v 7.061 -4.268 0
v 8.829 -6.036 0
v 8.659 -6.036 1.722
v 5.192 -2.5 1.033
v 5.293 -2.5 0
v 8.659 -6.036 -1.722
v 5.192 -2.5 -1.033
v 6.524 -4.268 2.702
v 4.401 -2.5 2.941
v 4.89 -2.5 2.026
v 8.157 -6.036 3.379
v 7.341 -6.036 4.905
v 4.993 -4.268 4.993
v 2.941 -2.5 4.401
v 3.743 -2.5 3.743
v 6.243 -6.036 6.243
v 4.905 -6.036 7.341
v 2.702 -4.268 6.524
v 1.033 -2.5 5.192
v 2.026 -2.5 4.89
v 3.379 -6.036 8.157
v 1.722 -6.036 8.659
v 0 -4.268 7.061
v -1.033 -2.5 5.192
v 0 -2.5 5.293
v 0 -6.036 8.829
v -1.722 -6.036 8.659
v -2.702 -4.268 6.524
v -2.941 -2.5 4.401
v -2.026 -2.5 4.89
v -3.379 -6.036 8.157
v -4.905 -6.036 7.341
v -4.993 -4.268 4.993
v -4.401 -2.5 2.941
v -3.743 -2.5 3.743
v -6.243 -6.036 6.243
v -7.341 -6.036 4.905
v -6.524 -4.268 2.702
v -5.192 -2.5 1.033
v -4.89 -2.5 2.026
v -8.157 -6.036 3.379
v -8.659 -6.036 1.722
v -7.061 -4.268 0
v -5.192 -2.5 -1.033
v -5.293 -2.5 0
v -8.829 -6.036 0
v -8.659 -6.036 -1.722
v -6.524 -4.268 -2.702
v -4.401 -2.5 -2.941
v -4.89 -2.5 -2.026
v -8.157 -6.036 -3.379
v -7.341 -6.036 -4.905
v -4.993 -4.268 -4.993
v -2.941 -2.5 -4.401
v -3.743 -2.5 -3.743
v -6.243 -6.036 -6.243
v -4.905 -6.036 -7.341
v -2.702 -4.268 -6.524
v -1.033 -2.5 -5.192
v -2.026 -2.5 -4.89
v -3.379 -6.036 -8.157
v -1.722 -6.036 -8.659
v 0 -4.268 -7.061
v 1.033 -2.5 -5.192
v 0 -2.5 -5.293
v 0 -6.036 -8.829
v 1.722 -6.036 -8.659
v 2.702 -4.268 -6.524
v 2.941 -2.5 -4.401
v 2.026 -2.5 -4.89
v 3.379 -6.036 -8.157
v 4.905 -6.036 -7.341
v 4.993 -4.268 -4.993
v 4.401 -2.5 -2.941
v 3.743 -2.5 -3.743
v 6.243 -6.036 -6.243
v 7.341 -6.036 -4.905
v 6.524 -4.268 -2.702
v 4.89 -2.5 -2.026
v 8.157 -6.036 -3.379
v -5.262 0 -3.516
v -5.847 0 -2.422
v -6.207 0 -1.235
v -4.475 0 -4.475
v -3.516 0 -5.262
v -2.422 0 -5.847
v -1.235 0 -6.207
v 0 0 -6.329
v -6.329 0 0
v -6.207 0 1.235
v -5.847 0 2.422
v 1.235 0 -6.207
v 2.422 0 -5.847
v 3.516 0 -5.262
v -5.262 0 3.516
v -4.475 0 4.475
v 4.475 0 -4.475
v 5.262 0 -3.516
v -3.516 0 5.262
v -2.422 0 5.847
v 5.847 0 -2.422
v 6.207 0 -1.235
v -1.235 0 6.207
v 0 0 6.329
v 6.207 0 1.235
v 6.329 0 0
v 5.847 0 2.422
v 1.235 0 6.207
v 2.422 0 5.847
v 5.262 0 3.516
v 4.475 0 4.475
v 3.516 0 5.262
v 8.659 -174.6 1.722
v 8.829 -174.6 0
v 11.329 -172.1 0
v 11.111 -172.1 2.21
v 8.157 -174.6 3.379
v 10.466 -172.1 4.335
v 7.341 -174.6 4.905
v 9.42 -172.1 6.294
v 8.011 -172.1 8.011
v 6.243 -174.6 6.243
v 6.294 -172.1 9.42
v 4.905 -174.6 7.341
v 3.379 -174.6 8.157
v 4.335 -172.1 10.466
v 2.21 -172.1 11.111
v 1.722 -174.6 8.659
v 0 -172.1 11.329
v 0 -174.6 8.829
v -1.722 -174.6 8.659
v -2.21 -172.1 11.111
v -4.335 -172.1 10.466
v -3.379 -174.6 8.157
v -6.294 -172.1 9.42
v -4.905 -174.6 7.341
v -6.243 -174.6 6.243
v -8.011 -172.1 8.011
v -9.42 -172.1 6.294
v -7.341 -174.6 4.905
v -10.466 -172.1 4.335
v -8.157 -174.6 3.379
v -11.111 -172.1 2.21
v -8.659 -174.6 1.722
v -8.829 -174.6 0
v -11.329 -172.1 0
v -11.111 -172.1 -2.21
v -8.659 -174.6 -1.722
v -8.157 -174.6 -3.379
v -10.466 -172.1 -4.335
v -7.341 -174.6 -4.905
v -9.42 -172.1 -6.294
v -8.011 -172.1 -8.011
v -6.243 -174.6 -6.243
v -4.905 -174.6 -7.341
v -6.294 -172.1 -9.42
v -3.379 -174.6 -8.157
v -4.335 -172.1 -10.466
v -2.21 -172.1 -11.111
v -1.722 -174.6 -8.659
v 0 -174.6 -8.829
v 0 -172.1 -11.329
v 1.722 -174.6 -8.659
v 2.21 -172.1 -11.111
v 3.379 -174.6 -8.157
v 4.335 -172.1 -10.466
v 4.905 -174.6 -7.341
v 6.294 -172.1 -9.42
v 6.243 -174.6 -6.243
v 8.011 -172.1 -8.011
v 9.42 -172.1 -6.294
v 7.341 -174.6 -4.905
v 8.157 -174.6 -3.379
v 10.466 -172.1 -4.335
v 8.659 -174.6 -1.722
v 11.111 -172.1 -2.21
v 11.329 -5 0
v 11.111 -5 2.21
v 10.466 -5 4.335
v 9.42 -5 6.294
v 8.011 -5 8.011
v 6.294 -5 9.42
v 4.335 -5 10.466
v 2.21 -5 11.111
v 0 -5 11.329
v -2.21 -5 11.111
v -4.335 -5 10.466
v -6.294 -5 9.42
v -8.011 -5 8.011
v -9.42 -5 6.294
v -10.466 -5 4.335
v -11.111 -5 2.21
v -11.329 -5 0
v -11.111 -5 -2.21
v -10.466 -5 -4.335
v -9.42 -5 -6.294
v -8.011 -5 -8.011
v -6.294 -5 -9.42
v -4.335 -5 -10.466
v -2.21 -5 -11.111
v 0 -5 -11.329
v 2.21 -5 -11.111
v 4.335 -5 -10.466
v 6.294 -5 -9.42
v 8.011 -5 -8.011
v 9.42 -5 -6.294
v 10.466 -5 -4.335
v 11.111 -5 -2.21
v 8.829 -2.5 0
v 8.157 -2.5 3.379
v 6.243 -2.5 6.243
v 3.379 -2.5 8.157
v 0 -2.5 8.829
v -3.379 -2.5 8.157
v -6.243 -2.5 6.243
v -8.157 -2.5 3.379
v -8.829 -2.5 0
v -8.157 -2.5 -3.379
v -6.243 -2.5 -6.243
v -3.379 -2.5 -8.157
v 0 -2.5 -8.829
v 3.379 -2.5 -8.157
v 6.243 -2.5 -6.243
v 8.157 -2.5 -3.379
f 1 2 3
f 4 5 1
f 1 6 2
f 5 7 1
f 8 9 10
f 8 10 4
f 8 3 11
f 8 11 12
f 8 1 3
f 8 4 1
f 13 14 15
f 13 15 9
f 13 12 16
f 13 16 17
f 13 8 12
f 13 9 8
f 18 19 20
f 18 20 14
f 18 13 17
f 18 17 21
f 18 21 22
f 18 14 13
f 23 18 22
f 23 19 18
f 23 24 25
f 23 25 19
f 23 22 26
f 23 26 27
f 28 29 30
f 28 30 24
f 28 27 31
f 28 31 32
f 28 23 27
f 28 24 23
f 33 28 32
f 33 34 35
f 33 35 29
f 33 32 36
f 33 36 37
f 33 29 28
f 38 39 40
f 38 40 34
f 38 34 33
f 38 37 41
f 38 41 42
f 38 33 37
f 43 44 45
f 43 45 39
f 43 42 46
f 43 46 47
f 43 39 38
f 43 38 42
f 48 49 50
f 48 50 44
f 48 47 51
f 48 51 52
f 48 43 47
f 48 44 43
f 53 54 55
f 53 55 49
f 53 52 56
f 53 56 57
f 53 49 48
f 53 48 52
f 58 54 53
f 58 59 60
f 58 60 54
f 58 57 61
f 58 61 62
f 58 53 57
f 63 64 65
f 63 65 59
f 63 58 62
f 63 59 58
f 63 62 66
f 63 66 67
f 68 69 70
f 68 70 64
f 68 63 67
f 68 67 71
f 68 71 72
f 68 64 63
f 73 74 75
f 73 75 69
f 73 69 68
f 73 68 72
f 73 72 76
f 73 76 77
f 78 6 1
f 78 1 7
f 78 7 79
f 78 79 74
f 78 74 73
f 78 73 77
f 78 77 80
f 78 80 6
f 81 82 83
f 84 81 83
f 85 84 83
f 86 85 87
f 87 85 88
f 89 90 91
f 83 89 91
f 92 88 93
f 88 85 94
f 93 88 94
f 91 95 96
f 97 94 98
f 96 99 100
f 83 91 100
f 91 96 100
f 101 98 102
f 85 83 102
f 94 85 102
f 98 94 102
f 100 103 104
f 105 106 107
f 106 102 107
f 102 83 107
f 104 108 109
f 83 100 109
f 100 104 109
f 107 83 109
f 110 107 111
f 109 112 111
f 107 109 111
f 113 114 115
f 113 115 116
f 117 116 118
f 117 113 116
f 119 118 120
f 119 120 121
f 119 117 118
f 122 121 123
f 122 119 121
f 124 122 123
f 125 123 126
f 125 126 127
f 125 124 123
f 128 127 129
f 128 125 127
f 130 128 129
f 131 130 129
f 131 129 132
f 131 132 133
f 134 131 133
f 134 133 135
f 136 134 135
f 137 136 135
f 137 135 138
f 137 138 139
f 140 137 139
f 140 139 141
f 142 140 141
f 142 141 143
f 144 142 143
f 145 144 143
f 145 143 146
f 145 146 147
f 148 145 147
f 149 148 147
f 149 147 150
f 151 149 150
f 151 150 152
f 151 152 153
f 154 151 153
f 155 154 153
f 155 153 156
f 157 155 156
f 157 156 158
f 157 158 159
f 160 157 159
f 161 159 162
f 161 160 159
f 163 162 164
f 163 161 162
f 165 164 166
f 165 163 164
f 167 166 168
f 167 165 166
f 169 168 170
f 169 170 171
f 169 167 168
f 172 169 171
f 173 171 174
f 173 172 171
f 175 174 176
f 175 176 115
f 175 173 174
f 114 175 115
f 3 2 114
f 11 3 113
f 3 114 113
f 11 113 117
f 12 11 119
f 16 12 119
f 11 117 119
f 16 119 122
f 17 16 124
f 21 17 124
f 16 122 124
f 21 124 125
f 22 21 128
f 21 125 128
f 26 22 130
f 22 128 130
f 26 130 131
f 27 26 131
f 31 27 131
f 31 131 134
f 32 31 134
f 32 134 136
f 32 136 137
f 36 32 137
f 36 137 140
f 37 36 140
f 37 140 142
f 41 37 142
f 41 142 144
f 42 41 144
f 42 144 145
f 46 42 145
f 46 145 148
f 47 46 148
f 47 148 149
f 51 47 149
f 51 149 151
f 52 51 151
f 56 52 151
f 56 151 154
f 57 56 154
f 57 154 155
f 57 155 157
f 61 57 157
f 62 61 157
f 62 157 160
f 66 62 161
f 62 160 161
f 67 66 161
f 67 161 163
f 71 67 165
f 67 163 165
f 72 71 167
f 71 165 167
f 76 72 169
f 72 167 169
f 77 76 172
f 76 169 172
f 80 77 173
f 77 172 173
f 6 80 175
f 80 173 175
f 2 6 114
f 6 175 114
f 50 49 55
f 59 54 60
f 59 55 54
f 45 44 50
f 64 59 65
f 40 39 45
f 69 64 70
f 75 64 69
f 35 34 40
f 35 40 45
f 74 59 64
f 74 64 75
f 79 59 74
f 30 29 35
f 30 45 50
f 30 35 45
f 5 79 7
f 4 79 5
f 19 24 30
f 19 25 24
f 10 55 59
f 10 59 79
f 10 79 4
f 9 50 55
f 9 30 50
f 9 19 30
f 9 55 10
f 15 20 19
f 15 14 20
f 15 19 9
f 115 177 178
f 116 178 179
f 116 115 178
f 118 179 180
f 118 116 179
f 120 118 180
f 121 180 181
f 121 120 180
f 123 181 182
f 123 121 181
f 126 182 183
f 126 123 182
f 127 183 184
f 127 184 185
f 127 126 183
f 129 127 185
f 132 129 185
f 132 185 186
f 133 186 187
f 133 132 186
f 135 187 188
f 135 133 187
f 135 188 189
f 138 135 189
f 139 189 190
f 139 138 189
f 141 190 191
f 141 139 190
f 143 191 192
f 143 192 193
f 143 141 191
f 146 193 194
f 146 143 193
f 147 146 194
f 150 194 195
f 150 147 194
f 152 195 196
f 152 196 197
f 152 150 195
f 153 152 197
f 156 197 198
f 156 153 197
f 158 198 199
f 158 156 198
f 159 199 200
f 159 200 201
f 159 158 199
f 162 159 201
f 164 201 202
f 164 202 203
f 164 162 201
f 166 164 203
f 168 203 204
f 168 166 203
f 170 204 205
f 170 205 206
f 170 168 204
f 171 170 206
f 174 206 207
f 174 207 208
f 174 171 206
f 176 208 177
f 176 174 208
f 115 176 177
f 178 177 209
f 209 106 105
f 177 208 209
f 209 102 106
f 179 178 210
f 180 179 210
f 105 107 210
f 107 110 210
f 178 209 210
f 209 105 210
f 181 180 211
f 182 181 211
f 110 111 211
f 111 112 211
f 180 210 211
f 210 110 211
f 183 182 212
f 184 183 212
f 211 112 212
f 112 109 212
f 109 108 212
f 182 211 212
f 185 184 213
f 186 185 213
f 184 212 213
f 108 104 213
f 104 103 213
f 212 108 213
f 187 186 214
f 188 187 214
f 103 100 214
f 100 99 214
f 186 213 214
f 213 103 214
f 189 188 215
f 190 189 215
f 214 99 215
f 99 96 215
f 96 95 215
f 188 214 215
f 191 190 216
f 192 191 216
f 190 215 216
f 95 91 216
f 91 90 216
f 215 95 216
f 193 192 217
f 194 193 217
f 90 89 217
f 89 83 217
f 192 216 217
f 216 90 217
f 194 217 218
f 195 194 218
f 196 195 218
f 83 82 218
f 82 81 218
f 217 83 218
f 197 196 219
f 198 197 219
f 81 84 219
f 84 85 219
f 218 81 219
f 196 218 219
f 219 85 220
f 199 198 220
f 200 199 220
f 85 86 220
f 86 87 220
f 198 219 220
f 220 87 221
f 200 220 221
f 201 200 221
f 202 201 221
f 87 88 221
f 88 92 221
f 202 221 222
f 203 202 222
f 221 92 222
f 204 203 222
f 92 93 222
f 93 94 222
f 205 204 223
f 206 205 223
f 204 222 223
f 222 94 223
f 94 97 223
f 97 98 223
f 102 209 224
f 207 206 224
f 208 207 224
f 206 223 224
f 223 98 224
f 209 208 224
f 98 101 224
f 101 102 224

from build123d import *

# Parameters (mm, degrees)
F0_R     = 11.3287531589
F1_DEPTH = 177.1
F2_DEPTH = 52.2
F3_SIZE  = 5
F4_T     = -2.5


with BuildPart() as f1:
    # F0 (on Front) → F1 (new body)
    with BuildSketch(Plane.XZ):
        Circle(F0_R)
    extrude(amount=F1_DEPTH)

    # F2 (add): a face of the model
    f2_faces = [f1.faces().sort_by_distance(p)[0] for p in [
        (0, -177.1, 0),
    ]]
    extrude(f2_faces, amount=-F2_DEPTH)

    # F3
    f3_edges = [f1.edges().sort_by_distance(p)[0] for p in [
        (-11.328753, -177.1, 0),
        (-11.328753, 0, 0),
    ]]
    chamfer(f3_edges, length=F3_SIZE)

    # F4
    f4_openings = [f1.faces().sort_by_distance(p)[0] for p in [
        (0, -177.1, 0),
        (-8.828753, -174.6, 0),
    ]]
    offset(amount=F4_T, openings=f4_openings)


solid = f1.part
